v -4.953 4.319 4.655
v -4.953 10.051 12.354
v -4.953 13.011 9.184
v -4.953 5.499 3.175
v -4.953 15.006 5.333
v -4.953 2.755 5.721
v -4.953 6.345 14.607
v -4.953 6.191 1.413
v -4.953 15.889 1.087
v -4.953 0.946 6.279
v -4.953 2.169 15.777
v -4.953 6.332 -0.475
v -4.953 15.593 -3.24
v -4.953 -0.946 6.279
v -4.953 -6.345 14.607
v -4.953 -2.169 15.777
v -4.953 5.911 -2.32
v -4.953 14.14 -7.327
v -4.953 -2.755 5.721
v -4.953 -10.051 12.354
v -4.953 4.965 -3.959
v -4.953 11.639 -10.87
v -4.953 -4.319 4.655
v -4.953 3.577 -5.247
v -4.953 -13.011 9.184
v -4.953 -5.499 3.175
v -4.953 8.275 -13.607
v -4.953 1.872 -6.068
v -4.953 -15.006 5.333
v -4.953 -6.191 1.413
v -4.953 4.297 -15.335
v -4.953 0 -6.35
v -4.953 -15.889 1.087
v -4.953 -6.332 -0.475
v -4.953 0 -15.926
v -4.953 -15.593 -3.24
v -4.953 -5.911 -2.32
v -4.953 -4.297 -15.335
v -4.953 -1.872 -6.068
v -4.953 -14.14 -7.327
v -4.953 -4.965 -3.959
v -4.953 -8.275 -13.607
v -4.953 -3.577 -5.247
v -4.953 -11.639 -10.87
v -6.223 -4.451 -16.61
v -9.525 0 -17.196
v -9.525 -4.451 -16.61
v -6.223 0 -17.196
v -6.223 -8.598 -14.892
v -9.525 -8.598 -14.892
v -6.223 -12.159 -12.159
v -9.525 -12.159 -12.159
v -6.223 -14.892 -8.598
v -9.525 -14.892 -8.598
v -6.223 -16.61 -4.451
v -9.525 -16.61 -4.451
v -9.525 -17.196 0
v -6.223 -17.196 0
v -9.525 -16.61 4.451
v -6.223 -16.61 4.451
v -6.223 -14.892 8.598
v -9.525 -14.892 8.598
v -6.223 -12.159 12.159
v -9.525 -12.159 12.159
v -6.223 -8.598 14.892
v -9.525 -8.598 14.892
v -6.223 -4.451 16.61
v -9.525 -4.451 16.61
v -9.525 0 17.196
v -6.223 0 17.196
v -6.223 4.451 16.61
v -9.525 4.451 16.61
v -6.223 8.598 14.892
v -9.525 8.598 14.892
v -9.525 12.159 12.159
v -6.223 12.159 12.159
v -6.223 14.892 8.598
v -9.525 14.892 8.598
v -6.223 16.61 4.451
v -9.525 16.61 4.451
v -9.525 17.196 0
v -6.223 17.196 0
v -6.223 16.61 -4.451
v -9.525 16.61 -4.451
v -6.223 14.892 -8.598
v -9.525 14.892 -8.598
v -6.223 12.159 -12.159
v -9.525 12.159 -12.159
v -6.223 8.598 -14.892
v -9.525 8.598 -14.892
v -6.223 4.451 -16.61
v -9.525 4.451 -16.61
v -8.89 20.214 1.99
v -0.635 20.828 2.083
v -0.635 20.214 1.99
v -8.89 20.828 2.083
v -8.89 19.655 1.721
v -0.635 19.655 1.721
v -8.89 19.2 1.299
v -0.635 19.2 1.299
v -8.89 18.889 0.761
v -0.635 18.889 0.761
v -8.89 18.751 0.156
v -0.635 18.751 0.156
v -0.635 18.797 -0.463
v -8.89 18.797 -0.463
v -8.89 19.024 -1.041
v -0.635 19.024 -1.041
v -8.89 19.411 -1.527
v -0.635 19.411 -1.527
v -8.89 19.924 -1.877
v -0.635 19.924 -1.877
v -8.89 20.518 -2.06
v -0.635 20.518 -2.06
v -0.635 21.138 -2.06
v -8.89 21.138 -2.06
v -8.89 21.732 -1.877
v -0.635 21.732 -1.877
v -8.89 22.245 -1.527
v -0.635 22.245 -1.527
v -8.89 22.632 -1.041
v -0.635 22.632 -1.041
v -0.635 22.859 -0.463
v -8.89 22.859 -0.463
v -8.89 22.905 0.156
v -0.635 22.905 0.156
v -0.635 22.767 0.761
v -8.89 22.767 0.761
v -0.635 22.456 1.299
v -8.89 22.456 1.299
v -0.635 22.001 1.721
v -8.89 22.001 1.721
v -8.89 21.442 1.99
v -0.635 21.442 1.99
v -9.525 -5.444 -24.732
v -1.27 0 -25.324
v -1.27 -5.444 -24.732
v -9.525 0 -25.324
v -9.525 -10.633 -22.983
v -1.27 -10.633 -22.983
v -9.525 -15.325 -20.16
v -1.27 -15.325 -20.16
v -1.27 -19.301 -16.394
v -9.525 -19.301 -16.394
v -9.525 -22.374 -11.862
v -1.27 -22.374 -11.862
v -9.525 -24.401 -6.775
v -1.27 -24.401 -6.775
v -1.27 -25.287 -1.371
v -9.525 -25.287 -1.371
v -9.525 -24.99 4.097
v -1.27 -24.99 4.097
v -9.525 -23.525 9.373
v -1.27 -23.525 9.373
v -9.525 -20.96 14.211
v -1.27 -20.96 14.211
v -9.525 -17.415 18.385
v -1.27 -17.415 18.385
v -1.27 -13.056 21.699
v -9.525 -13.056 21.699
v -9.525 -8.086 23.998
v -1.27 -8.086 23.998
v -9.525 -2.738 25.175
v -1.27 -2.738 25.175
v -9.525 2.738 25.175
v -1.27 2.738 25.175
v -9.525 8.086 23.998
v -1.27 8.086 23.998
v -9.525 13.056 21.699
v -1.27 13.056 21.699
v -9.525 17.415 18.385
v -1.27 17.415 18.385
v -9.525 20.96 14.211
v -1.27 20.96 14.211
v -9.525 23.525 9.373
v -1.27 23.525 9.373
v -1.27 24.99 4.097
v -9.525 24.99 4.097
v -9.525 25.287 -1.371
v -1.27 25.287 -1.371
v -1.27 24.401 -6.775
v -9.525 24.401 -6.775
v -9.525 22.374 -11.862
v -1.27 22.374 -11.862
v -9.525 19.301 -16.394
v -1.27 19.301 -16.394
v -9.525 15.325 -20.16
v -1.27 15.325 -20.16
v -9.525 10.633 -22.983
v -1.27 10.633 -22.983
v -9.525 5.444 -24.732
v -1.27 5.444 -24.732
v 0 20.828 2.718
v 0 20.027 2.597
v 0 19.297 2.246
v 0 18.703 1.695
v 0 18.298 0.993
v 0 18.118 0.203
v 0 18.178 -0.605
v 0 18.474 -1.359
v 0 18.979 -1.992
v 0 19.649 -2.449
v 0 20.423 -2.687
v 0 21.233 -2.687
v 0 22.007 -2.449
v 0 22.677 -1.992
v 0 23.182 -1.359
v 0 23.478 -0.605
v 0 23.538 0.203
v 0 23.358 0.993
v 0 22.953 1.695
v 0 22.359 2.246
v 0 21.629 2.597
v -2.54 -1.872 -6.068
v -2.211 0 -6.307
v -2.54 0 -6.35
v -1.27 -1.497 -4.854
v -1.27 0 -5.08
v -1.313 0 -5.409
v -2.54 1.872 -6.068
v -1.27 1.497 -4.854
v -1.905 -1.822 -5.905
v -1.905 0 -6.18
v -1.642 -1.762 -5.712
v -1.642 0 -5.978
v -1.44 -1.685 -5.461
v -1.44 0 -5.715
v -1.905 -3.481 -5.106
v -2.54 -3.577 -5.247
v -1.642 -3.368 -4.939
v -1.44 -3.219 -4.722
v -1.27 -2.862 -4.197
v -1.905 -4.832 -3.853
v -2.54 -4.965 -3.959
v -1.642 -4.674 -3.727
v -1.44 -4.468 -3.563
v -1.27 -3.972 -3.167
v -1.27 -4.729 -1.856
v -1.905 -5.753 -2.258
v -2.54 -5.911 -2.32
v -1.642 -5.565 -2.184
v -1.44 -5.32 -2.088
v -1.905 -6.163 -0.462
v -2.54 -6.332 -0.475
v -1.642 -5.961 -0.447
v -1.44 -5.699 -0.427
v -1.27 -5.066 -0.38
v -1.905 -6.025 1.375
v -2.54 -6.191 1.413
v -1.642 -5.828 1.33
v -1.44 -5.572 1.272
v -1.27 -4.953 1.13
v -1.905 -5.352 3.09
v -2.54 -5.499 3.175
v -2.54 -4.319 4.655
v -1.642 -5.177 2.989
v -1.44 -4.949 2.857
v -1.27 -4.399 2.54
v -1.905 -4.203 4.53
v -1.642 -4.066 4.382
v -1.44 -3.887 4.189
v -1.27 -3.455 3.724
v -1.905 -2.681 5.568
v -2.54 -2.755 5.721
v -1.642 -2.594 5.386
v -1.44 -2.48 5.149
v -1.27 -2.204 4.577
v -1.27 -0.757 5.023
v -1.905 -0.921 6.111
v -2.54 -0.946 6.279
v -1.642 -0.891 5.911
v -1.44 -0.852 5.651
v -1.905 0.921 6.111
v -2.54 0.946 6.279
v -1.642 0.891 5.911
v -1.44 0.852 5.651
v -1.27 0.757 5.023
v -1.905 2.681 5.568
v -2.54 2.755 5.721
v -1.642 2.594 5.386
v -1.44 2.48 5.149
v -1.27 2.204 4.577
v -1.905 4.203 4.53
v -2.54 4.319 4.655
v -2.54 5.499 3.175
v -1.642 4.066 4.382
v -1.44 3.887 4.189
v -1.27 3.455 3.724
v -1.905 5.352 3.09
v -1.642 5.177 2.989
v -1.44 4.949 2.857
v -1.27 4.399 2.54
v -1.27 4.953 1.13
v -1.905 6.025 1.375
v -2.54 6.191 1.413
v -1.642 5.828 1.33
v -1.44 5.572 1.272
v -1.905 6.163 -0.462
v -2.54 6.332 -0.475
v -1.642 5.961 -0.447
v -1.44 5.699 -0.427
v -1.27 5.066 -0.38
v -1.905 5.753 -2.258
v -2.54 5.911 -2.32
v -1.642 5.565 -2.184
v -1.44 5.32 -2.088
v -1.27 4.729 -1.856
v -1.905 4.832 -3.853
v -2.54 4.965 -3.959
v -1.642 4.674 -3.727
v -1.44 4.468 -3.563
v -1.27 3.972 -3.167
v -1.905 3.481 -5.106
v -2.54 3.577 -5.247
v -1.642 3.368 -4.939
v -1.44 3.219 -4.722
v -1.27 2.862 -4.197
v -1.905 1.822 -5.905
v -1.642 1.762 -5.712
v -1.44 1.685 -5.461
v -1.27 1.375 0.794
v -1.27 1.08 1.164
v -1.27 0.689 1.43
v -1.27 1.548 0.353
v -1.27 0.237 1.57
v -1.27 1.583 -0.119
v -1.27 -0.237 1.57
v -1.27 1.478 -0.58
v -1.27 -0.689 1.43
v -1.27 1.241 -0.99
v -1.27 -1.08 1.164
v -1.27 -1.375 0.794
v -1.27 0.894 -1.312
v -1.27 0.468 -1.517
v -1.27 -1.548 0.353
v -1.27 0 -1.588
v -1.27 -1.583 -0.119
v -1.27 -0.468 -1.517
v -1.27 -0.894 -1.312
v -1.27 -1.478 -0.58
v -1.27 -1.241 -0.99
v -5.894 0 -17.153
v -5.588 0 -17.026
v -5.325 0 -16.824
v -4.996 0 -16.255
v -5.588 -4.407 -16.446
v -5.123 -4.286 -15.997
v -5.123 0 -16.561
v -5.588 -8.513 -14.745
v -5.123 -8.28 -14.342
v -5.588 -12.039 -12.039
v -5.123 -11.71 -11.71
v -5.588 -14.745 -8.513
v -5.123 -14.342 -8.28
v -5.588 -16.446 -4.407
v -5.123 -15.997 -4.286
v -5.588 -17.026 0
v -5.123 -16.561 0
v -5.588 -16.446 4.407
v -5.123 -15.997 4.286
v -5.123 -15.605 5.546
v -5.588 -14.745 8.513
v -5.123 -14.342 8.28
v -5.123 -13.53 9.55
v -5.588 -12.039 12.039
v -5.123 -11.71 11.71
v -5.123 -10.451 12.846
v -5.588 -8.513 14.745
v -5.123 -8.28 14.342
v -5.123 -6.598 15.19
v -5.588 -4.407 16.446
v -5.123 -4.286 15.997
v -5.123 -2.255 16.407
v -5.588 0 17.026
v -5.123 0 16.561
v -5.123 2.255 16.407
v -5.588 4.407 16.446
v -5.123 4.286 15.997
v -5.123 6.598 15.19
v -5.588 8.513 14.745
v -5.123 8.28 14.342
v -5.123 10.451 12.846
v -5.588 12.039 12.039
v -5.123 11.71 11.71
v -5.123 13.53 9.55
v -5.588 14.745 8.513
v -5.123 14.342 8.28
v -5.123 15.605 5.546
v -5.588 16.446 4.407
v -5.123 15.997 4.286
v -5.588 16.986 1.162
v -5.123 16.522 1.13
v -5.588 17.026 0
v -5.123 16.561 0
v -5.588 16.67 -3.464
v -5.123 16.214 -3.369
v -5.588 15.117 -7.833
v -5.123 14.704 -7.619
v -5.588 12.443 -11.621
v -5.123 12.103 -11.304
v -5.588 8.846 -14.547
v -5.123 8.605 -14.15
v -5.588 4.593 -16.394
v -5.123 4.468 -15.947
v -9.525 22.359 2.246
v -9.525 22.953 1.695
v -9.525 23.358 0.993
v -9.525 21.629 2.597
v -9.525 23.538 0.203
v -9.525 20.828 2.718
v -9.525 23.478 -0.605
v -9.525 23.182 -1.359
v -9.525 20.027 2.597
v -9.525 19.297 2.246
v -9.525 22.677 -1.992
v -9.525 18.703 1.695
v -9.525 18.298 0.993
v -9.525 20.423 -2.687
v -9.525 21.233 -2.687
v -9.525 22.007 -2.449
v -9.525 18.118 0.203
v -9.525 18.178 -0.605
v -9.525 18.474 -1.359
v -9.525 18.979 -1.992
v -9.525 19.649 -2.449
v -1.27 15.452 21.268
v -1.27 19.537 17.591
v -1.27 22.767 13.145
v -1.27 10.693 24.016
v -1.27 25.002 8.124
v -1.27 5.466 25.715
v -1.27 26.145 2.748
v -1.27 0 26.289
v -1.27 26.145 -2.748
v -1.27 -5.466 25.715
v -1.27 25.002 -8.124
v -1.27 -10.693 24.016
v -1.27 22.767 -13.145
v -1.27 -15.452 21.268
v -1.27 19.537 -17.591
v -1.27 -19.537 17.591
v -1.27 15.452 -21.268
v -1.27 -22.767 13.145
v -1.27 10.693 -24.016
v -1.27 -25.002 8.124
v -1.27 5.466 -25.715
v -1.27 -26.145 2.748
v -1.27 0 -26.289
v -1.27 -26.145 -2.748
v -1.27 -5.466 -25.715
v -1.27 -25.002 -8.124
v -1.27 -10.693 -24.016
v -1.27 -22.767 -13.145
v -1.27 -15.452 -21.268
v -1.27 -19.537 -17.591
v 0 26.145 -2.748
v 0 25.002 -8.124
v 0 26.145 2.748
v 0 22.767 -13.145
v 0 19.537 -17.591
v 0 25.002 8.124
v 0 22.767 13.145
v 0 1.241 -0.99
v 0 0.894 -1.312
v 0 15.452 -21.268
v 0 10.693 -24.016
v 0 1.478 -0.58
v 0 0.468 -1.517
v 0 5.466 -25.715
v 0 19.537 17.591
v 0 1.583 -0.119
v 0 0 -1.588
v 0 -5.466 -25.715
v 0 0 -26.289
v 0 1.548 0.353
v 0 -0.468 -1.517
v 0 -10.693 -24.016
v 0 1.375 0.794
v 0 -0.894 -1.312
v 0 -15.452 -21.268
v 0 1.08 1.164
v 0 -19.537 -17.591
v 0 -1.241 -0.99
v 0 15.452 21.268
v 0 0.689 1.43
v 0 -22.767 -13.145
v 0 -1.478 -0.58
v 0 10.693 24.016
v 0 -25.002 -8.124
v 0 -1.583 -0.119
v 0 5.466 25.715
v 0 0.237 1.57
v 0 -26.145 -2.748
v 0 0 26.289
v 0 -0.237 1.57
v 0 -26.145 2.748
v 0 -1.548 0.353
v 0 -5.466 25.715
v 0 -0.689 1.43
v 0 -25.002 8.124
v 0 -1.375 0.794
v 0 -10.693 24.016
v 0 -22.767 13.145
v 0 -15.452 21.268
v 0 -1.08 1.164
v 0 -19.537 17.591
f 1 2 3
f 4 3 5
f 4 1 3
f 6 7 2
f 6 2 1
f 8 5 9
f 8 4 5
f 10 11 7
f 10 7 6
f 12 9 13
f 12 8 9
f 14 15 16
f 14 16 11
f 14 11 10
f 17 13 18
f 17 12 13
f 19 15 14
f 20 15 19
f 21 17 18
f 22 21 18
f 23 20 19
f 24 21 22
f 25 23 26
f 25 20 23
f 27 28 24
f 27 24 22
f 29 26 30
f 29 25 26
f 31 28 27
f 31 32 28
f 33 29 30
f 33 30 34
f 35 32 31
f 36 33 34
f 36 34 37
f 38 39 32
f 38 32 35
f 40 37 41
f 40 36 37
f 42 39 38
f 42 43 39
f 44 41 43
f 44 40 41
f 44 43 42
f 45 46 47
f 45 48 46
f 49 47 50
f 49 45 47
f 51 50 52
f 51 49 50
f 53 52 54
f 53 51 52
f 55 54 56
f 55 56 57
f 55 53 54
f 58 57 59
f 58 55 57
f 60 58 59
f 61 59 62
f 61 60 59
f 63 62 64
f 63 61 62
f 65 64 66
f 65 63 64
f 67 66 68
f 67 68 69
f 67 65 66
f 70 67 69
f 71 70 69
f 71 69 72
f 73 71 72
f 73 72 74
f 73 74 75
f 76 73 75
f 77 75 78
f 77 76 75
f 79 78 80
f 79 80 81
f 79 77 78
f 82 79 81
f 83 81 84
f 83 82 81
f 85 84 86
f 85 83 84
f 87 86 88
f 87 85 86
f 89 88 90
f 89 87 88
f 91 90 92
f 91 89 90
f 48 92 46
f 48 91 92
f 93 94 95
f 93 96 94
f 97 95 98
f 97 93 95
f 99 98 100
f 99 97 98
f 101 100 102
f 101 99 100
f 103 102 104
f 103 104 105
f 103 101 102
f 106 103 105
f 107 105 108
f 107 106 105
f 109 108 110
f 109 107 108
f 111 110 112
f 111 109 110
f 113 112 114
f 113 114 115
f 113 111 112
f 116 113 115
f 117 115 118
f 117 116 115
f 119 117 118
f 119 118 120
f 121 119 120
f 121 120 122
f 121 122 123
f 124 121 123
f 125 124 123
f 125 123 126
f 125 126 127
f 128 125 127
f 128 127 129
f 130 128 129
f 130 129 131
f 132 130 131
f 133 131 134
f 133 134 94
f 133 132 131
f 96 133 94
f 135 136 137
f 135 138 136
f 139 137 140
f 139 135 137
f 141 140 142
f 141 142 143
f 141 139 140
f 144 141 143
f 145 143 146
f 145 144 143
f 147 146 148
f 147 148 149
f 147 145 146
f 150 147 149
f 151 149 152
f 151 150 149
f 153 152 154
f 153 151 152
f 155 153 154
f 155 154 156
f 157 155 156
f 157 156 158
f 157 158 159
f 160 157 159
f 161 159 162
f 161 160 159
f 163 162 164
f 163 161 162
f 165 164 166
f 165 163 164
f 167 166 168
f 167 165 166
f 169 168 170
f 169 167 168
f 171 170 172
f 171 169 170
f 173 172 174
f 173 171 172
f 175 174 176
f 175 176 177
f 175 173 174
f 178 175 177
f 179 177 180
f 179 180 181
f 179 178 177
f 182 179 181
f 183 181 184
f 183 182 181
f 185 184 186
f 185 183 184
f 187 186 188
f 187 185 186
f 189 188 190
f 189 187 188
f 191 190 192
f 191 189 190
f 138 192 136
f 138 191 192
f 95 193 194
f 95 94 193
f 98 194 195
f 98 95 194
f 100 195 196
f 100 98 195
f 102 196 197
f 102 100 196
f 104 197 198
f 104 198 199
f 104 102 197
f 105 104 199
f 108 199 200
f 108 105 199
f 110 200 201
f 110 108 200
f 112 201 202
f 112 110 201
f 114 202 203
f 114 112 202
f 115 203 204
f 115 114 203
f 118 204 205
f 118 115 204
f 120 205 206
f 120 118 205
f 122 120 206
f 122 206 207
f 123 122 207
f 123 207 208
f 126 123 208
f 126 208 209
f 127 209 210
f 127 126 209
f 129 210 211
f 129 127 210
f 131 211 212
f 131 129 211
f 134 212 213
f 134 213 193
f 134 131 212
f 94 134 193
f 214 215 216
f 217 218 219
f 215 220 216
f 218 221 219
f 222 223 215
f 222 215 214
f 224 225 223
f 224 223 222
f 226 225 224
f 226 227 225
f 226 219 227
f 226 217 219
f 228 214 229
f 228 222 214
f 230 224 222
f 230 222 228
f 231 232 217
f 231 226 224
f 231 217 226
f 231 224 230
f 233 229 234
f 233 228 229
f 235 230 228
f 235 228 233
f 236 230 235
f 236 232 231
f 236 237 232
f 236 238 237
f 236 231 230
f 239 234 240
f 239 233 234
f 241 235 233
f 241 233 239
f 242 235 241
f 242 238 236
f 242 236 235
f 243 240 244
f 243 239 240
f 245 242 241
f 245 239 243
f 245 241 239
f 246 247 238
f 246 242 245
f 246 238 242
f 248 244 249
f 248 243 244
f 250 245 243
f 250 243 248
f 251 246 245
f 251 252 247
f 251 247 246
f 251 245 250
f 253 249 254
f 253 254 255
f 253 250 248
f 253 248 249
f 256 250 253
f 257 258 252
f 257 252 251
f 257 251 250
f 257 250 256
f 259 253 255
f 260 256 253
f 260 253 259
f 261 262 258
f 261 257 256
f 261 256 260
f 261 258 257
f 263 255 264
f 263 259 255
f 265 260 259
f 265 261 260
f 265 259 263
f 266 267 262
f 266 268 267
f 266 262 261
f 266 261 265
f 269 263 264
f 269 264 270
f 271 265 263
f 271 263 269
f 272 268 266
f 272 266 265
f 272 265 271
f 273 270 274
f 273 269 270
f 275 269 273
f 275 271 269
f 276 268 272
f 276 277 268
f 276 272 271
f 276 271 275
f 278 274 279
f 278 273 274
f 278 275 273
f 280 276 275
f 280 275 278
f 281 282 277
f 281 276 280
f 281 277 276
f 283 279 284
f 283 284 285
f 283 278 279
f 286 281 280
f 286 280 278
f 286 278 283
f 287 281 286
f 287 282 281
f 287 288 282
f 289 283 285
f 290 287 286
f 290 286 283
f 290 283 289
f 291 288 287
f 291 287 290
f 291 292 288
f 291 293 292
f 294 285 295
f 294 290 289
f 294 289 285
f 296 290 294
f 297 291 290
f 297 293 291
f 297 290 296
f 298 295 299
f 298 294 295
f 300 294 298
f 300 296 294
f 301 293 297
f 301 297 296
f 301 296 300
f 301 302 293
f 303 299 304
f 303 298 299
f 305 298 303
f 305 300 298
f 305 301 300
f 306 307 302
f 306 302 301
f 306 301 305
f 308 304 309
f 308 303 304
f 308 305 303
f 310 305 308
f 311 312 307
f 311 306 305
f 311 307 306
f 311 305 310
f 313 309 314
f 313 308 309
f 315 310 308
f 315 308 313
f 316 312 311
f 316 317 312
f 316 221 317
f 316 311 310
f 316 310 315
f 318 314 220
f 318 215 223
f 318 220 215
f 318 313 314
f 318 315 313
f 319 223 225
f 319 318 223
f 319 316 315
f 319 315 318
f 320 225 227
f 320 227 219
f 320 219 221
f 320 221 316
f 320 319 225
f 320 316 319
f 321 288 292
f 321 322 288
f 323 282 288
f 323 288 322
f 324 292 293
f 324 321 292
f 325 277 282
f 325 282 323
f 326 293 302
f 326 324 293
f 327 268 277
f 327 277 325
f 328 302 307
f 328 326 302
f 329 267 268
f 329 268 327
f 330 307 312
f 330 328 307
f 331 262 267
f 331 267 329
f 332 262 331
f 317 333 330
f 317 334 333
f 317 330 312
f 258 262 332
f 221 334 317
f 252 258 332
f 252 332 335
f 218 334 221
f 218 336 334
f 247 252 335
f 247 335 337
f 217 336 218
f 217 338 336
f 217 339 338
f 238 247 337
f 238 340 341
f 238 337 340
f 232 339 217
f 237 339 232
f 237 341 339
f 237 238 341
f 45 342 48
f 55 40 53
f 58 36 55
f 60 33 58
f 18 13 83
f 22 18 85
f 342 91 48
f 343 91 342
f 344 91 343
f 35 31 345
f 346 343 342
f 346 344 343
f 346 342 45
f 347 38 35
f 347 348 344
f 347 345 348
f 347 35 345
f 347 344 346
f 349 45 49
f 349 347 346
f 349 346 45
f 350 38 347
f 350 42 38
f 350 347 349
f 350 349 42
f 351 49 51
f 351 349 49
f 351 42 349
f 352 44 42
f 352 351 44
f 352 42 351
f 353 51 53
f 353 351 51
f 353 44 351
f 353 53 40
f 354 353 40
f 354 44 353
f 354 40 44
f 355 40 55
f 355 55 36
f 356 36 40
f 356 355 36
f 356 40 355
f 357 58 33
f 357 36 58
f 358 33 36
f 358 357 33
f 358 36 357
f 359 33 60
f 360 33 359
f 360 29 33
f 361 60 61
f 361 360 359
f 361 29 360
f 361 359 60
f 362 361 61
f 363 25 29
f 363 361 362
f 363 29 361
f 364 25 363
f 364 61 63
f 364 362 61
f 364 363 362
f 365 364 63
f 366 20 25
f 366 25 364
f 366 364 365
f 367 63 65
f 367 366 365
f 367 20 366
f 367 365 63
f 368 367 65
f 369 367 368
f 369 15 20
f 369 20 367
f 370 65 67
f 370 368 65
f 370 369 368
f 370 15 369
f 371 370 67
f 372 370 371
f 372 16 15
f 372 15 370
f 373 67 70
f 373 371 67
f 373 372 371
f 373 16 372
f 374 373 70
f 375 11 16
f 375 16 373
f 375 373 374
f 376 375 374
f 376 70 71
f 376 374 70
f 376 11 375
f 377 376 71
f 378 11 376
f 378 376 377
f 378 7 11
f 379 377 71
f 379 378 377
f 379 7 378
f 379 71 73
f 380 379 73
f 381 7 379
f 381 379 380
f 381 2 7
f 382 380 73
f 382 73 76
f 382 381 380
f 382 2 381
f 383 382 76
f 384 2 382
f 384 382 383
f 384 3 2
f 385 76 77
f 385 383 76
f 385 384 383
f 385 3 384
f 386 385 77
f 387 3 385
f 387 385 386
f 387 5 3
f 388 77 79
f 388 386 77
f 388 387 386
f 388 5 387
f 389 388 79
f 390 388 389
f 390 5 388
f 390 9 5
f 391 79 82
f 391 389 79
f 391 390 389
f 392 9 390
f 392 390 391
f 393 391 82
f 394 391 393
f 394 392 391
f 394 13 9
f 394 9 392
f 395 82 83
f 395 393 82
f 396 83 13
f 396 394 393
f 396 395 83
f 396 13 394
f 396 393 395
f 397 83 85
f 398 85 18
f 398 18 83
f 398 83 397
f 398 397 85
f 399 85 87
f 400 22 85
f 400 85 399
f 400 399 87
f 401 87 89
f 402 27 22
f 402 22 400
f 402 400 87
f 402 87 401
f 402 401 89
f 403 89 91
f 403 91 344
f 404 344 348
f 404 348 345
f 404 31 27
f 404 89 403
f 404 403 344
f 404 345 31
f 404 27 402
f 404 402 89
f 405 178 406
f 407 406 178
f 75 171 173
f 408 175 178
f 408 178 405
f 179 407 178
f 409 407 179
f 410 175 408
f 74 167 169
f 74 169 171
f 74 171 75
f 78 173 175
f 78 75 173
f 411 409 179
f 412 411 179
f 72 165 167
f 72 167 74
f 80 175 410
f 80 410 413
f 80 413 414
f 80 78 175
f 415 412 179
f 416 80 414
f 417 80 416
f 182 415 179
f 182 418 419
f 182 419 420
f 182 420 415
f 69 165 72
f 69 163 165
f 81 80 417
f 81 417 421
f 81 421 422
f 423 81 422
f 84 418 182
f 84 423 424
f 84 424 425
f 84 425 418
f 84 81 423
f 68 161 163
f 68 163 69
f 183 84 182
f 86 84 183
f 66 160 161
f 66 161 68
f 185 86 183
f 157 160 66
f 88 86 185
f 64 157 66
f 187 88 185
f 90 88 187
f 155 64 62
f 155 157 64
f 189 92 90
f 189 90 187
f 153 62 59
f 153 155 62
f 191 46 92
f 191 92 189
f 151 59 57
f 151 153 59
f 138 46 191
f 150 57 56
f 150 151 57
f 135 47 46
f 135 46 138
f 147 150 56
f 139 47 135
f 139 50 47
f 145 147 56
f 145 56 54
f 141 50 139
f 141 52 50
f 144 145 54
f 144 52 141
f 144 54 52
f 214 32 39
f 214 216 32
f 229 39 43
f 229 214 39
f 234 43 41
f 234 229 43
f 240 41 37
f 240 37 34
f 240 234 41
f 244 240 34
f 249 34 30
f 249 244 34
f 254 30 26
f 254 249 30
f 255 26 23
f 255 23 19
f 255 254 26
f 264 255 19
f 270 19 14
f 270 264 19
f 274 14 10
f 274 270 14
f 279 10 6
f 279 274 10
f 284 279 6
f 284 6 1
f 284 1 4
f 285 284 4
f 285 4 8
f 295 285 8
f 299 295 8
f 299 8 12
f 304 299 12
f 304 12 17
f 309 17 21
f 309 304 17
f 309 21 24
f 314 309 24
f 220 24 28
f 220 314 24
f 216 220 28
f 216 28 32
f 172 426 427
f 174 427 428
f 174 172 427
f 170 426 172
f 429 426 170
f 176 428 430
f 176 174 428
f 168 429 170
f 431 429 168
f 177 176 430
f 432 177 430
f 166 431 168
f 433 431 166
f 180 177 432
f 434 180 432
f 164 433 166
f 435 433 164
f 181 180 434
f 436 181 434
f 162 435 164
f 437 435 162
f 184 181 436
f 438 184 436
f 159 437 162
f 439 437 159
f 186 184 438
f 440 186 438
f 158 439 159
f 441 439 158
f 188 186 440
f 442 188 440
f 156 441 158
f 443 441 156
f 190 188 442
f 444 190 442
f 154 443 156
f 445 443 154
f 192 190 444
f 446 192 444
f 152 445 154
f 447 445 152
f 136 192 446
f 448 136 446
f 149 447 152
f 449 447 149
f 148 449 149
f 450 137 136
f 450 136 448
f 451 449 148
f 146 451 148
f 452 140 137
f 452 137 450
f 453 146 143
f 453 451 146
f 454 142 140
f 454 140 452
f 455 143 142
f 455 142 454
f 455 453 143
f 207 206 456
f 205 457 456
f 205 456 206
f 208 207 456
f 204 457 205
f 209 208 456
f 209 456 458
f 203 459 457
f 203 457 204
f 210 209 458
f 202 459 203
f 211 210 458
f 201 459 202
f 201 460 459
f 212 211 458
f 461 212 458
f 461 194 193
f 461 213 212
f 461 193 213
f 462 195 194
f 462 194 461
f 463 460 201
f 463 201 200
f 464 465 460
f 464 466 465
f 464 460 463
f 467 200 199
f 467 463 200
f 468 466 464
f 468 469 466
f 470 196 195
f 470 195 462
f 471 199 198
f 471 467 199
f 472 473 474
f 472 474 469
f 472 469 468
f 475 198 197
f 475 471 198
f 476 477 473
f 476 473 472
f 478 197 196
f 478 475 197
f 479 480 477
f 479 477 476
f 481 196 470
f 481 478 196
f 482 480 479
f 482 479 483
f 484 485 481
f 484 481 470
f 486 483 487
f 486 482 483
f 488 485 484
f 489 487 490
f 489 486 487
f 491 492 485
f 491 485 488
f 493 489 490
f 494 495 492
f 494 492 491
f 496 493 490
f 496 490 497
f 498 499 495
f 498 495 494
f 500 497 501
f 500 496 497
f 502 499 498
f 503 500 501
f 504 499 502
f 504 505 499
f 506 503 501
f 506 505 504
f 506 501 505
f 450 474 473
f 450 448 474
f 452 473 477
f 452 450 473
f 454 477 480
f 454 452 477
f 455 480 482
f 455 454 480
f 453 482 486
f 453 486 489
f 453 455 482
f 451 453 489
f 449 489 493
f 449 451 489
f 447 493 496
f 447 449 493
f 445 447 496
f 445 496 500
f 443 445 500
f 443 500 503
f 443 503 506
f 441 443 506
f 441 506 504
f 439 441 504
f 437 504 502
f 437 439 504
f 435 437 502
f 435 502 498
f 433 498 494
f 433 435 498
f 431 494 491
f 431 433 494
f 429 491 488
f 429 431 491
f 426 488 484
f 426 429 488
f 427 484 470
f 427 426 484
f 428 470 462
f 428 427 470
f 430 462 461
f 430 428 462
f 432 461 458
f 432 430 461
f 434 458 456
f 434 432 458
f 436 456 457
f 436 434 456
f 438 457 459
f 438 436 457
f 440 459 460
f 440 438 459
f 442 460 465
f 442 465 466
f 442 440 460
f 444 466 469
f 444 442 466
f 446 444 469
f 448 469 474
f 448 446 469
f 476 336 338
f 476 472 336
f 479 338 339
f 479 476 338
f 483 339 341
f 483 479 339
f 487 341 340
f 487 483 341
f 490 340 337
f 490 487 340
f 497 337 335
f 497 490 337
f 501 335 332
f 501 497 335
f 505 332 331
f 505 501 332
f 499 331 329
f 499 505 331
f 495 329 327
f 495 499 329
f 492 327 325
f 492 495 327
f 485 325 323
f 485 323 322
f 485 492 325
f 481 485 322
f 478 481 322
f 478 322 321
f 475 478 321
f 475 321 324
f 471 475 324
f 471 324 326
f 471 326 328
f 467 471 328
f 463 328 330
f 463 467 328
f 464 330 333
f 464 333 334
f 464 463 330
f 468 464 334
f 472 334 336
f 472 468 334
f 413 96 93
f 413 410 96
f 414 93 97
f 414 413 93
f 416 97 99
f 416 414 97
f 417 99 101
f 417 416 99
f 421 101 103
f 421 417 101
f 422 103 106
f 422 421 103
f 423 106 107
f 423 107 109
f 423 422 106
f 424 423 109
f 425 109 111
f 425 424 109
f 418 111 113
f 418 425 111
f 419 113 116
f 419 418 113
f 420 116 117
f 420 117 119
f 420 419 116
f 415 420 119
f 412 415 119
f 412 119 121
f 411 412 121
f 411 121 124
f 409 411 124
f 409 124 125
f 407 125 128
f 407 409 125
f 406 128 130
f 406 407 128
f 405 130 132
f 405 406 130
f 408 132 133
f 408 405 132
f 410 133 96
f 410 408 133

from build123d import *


with BuildPart() as part:
    # Sketch1 → Revolve1 (revolve)
    with BuildSketch(Plane.XY, mode=Mode.PRIVATE) as revolve1_sk:
        with BuildLine():
            Line((0, 1.5875), (0, 26.289))
            Line((0, 26.289), (-1.27, 26.289))
            Line((-1.27, 26.289), (-1.27, 25.3238))
            Line((-1.27, 25.3238), (-9.525, 25.3238))
            Line((-9.525, 25.3238), (-9.525, 17.1958))
            Line((-9.525, 17.1958), (-6.223, 17.1958))
            ThreePointArc((-6.223, 17.1958), (-5.324974388, 16.823825612), (-4.953, 15.9258))
            Line((-4.953, 15.9258), (-4.953, 6.35))
            Line((-4.953, 6.35), (-2.54, 6.35))
            ThreePointArc((-2.54, 6.35), (-1.641974388, 5.978025612), (-1.27, 5.08))
            Line((-1.27, 5.08), (-1.27, 1.5875))
            Line((-1.27, 1.5875), (0, 1.5875))
        make_face()
    revolve(revolve1_sk.sketch.rotate(Axis((0, 0, 0), (-1, 0, 0)), 90), axis=Axis((0, 0, 0), (-1, 0, 0)))  # turned: the seam where the file's is

    # Sketch3 → #8-32 Tapped Hole1 (revolve, cut)
    with BuildSketch(Plane(origin=(-9.525, 20.828, 0), x_dir=(0, 0, 1), z_dir=(0, 1, 0))):
        Polygon((0, 0), (0, 9.525), (2.7178, 9.525), (2.0828, 8.89), (2.0828, 0.635), (2.7178, 0), align=None)
    revolve(axis=Axis((-15.875, 20.828, 0), (1, 0, 0)), mode=Mode.SUBTRACT)


solid = part.part
